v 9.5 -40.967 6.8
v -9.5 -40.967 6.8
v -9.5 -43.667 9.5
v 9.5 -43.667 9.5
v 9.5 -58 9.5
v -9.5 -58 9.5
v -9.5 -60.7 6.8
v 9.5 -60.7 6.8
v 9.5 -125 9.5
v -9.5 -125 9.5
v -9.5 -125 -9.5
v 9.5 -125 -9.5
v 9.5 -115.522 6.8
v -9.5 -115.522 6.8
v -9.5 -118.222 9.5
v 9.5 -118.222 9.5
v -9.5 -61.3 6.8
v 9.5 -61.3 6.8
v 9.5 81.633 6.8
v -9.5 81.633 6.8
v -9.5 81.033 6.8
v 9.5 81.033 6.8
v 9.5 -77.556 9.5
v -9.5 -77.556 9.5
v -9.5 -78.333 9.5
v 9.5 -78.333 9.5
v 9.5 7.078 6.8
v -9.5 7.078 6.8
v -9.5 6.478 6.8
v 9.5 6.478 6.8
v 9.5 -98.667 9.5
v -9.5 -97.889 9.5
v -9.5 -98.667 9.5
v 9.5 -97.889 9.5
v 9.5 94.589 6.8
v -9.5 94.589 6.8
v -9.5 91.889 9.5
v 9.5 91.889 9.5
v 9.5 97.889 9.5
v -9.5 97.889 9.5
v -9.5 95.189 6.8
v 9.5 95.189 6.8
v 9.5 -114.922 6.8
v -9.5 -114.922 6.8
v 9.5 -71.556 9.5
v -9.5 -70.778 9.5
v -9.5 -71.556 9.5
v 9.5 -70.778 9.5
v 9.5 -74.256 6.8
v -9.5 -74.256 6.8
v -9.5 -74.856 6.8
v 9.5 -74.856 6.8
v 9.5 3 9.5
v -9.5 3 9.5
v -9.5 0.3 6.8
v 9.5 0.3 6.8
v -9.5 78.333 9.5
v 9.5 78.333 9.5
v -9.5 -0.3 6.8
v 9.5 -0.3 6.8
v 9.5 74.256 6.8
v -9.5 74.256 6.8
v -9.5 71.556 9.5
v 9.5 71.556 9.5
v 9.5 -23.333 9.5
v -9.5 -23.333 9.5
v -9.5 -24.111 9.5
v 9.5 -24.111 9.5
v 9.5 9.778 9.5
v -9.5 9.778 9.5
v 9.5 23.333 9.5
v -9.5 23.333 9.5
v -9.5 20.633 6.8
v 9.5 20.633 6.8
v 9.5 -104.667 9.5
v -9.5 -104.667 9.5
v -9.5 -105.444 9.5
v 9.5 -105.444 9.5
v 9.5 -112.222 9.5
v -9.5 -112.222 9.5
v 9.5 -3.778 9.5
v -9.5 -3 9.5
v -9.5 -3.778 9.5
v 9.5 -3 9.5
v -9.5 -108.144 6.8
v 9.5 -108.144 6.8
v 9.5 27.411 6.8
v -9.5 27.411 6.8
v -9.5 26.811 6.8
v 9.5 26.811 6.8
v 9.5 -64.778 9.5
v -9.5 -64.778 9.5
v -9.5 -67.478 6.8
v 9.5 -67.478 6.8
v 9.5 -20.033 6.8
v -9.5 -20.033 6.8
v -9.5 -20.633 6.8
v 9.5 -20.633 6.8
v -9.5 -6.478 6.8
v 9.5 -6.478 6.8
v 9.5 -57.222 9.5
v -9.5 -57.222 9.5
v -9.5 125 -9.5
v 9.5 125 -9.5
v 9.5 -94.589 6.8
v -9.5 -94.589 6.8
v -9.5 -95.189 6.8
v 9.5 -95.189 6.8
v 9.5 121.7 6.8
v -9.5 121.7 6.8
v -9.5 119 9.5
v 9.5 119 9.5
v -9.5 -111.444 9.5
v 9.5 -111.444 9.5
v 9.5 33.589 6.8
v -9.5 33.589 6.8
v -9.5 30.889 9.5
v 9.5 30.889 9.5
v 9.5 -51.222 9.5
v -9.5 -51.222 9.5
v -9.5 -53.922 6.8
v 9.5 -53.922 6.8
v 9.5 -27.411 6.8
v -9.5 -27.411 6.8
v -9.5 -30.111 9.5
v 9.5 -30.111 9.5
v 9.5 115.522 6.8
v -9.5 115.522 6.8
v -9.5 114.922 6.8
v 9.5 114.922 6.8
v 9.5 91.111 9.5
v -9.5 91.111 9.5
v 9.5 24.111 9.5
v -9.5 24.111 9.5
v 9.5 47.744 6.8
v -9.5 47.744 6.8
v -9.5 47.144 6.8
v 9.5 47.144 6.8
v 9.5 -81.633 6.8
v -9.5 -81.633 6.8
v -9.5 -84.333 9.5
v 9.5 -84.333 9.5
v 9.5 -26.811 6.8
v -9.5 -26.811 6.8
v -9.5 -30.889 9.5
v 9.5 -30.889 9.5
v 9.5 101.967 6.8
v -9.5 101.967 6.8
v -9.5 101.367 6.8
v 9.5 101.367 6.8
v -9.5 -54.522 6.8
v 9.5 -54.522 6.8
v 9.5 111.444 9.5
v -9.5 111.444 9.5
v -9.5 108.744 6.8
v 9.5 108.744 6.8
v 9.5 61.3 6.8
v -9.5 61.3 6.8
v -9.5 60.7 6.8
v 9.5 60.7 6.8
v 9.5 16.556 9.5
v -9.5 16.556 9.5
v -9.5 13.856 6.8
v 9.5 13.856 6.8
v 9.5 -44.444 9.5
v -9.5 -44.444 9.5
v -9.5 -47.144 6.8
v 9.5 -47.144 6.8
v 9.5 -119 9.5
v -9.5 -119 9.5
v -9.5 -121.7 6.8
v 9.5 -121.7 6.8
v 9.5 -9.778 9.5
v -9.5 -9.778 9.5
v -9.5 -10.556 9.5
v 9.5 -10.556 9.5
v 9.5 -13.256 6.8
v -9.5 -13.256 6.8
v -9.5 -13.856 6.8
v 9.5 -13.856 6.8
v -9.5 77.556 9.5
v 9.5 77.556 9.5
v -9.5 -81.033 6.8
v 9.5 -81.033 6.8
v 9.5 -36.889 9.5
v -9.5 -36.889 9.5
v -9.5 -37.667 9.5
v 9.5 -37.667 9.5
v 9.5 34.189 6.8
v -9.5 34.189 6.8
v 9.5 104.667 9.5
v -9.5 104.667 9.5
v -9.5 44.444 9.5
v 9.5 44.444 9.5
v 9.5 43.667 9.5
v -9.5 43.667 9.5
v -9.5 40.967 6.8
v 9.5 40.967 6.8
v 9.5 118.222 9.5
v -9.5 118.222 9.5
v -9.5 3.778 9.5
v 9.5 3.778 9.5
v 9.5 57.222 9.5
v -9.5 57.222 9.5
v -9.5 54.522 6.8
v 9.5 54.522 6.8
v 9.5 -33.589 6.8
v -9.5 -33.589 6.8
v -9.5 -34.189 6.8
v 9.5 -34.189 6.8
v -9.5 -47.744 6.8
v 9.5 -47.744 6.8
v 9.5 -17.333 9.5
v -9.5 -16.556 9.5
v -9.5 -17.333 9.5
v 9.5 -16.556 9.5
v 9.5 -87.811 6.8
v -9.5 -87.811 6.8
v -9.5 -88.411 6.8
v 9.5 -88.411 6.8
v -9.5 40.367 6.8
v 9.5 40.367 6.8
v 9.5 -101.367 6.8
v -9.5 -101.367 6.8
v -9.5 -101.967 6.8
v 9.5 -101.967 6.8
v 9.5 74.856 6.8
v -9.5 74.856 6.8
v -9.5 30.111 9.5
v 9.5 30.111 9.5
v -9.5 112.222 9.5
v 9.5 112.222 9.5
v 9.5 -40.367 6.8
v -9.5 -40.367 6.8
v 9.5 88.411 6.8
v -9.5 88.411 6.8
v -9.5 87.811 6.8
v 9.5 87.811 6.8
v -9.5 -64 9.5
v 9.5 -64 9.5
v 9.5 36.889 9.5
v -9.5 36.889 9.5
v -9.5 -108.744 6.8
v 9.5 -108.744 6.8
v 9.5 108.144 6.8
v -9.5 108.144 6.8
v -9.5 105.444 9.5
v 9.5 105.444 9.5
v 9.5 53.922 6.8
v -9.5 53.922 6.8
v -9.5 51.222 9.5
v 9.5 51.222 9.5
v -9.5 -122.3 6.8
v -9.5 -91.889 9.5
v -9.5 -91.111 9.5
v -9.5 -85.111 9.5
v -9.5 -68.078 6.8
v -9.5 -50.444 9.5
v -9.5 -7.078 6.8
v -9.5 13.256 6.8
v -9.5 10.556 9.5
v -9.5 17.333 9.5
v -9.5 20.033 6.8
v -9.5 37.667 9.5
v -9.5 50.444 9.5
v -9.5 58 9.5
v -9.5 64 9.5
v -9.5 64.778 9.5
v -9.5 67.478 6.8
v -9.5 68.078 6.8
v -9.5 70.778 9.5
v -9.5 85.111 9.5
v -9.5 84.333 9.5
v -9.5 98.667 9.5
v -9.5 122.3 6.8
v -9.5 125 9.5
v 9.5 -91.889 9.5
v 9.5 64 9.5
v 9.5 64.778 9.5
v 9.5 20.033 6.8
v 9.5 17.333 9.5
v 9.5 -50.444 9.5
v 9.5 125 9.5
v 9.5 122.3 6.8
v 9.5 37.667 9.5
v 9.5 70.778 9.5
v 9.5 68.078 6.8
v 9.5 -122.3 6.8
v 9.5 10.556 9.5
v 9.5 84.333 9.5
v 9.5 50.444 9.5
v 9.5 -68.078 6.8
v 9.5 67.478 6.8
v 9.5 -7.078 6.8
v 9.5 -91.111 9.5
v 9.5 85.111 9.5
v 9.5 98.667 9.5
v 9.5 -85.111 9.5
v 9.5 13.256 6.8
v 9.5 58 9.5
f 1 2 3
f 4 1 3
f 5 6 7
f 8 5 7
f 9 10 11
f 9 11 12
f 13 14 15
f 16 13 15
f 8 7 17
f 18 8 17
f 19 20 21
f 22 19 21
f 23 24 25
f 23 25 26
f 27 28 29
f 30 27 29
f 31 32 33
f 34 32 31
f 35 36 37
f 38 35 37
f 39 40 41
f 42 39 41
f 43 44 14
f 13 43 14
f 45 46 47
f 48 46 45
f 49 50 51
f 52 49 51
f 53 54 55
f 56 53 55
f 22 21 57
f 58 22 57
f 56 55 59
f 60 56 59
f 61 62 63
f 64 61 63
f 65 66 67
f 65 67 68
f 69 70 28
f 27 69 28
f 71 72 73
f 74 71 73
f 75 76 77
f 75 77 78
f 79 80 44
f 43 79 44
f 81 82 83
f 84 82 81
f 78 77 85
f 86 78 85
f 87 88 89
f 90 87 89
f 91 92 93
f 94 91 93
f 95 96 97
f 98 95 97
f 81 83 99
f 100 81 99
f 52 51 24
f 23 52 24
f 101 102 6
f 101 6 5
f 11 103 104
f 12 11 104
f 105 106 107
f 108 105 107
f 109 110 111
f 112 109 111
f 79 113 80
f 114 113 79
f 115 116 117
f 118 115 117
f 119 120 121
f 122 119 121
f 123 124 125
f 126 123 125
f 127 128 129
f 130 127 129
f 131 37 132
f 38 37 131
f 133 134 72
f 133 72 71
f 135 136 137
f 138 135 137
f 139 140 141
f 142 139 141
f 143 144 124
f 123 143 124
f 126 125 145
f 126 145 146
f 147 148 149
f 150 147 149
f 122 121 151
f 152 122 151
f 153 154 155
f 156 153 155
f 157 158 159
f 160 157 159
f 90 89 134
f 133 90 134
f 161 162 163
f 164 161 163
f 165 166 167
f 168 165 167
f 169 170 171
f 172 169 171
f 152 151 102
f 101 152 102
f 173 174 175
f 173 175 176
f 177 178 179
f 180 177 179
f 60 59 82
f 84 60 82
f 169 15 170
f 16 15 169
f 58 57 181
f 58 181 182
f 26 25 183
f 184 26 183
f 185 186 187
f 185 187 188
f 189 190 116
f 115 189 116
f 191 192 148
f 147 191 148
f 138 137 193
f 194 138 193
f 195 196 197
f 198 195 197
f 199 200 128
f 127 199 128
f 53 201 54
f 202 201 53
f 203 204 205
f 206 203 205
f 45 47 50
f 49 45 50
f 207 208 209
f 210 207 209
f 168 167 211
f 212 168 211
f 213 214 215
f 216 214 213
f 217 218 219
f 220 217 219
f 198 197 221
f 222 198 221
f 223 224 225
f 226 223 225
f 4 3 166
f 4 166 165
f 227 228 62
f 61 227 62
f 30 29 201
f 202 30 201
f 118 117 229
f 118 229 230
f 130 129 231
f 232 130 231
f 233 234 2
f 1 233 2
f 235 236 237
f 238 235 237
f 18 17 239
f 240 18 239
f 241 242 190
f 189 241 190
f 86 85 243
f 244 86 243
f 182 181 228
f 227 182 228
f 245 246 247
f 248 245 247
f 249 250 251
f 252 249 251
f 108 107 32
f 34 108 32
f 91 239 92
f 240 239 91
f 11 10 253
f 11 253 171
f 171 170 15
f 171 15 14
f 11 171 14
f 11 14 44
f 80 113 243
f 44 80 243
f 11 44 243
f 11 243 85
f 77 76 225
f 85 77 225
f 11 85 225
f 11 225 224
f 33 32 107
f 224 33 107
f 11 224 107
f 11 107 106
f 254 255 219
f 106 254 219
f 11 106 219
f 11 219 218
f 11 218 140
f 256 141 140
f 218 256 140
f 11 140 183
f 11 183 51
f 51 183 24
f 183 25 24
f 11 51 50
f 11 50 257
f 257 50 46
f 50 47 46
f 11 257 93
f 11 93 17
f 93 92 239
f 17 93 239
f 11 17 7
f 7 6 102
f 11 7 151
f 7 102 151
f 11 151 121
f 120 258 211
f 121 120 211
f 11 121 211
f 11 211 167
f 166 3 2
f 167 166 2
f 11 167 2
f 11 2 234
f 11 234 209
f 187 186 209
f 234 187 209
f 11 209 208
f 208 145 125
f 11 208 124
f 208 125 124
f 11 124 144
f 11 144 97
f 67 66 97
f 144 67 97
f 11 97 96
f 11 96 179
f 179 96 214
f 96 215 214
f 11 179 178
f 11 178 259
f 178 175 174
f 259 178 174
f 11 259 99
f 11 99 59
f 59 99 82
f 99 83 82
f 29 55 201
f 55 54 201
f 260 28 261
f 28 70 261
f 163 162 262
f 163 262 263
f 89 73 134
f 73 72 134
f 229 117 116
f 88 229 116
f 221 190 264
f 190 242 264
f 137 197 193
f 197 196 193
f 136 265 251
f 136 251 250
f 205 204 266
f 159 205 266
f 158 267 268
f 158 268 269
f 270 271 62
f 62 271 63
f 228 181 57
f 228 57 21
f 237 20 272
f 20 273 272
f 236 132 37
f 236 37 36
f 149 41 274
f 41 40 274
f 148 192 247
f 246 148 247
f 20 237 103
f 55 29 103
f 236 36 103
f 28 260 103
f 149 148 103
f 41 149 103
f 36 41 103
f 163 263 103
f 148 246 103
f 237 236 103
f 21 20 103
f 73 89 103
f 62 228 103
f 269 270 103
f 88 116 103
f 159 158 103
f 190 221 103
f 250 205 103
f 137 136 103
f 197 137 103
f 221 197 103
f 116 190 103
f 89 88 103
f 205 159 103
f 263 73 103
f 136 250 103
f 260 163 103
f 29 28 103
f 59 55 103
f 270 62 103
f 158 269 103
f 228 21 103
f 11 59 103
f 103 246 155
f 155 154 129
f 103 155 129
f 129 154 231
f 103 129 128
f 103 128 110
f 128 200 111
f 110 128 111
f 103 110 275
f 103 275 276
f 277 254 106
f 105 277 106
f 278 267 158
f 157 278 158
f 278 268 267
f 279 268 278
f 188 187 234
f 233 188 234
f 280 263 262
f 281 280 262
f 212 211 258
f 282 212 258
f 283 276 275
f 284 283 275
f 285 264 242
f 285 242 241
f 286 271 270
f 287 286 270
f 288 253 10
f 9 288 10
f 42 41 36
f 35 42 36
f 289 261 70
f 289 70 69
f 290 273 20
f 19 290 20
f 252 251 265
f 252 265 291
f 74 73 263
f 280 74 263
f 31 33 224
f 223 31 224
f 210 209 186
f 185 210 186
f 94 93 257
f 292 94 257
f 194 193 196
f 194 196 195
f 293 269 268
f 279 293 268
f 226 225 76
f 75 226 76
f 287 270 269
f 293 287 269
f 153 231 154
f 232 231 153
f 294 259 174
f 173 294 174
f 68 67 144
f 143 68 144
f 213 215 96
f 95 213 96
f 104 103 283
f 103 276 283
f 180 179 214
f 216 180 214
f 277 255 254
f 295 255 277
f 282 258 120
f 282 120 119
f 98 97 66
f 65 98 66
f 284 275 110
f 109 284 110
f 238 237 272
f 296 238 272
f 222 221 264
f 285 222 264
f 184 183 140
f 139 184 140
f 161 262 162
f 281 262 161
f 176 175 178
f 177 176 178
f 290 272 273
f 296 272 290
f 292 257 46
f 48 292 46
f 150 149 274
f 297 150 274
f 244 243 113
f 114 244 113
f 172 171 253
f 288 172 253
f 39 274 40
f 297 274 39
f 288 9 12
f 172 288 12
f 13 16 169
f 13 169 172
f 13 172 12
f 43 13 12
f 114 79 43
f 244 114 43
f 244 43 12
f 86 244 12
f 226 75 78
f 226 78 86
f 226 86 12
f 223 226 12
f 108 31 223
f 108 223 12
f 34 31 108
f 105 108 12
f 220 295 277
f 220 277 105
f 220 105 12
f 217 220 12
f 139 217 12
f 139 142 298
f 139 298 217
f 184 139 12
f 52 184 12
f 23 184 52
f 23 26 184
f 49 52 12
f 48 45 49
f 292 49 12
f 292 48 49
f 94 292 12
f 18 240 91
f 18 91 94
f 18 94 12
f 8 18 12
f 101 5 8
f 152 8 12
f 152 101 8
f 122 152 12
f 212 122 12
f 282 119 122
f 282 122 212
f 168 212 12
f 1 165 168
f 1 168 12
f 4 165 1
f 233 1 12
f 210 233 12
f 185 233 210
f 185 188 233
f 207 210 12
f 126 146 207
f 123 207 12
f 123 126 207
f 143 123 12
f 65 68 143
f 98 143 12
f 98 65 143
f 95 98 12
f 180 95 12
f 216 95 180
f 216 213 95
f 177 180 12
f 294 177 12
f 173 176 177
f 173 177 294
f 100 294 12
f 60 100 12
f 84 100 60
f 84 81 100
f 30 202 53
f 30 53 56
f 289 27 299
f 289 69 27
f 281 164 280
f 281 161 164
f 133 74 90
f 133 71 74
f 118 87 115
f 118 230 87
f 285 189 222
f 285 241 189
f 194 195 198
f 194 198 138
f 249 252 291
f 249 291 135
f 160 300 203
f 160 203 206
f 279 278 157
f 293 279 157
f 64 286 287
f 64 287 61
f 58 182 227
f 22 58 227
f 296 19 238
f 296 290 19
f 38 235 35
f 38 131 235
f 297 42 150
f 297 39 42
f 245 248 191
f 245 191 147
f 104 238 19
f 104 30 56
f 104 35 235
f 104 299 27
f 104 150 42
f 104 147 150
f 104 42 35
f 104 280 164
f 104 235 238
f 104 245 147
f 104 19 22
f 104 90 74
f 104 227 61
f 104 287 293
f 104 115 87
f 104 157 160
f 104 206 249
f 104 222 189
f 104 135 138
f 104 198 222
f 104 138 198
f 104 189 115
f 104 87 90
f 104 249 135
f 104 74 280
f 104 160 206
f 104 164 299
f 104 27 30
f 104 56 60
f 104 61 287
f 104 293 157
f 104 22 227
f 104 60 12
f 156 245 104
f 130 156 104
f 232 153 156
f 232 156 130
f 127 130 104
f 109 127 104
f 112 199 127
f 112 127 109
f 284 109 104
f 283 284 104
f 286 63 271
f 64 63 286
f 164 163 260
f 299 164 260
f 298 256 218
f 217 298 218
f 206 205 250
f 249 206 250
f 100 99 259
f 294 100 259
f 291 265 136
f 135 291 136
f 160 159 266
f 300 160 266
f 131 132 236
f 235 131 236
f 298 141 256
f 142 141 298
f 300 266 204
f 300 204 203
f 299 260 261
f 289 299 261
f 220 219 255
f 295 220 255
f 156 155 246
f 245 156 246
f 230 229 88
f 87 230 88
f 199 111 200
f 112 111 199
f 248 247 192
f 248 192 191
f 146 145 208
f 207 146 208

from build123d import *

# Parameters (mm, degrees)
SKETCH1_W           = 19
SKETCH1_H           = 250
BOSS_EXTRUDE1_DEPTH = 9.5
CUT_EXTRUDE1_DEPTH  = 29


with BuildPart() as part:
    # Sketch1 → Boss-Extrude1 (new body, symmetric)
    with BuildSketch(Plane.XY):
        Rectangle(SKETCH1_W, SKETCH1_H)
    extrude(amount=BOSS_EXTRUDE1_DEPTH, both=True)

    # Sketch2 → Cut-Extrude1 (cut)
    with BuildSketch(Plane.ZY.offset(9.5)):
        Polygon((9.5, 125), (6.8, 122.3), (6.8, 121.7), (9.5, 119), (10.5, 119), (10.5, 125), align=None)
        Polygon((9.5, 118.222222222), (6.8, 115.522222222), (6.8, 114.922222222), (9.5, 112.222222222), (10.5, 112.222222222), (10.5, 118.222222222), align=None)
        Polygon((9.5, 111.444444444), (6.8, 108.744444444), (6.8, 108.144444444), (9.5, 105.444444444), (10.5, 105.444444444), (10.5, 111.444444444), align=None)
        Polygon((9.5, 104.666666667), (6.8, 101.966666667), (6.8, 101.366666667), (9.5, 98.666666667), (10.5, 98.666666667), (10.5, 104.666666667), align=None)
        Polygon((9.5, 97.888888889), (6.8, 95.188888889), (6.8, 94.588888889), (9.5, 91.888888889), (10.5, 91.888888889), (10.5, 97.888888889), align=None)
        Polygon((9.5, 91.111111111), (6.8, 88.411111111), (6.8, 87.811111111), (9.5, 85.111111111), (10.5, 85.111111111), (10.5, 91.111111111), align=None)
        Polygon((9.5, 84.333333333), (6.8, 81.633333333), (6.8, 81.033333333), (9.5, 78.333333333), (10.5, 78.333333333), (10.5, 84.333333333), align=None)
        Polygon((9.5, 77.555555556), (6.8, 74.855555556), (6.8, 74.255555556), (9.5, 71.555555556), (10.5, 71.555555556), (10.5, 77.555555556), align=None)
        Polygon((9.5, 70.777777778), (6.8, 68.077777778), (6.8, 67.477777778), (9.5, 64.777777778), (10.5, 64.777777778), (10.5, 70.777777778), align=None)
        Polygon((9.5, 64), (6.8, 61.3), (6.8, 60.7), (9.5, 58), (10.5, 58), (10.5, 64), align=None)
        Polygon((9.5, 57.222222222), (6.8, 54.522222222), (6.8, 53.922222222), (9.5, 51.222222222), (10.5, 51.222222222), (10.5, 57.222222222), align=None)
        Polygon((9.5, 50.444444444), (6.8, 47.744444444), (6.8, 47.144444444), (9.5, 44.444444444), (10.5, 44.444444444), (10.5, 50.444444444), align=None)
        Polygon((9.5, 43.666666667), (6.8, 40.966666667), (6.8, 40.366666667), (9.5, 37.666666667), (10.5, 37.666666667), (10.5, 43.666666667), align=None)
        Polygon((9.5, 36.888888889), (6.8, 34.188888889), (6.8, 33.588888889), (9.5, 30.888888889), (10.5, 30.888888889), (10.5, 36.888888889), align=None)
        Polygon((9.5, 30.111111111), (6.8, 27.411111111), (6.8, 26.811111111), (9.5, 24.111111111), (10.5, 24.111111111), (10.5, 30.111111111), align=None)
        Polygon((9.5, 23.333333333), (6.8, 20.633333333), (6.8, 20.033333333), (9.5, 17.333333333), (10.5, 17.333333333), (10.5, 23.333333333), align=None)
        Polygon((9.5, 16.555555556), (6.8, 13.855555556), (6.8, 13.255555556), (9.5, 10.555555556), (10.5, 10.555555556), (10.5, 16.555555556), align=None)
        Polygon((9.5, 9.777777778), (6.8, 7.077777778), (6.8, 6.477777778), (9.5, 3.777777778), (10.5, 3.777777778), (10.5, 9.777777778), align=None)
        Polygon((9.5, 3), (6.8, 0.3), (6.8, -0.3), (9.5, -3), (10.5, -3), (10.5, 3), align=None)
        Polygon((9.5, -3.777777778), (6.8, -6.477777778), (6.8, -7.077777778), (9.5, -9.777777778), (10.5, -9.777777778), (10.5, -3.777777778), align=None)
        Polygon((9.5, -10.555555556), (6.8, -13.255555556), (6.8, -13.855555556), (9.5, -16.555555556), (10.5, -16.555555556), (10.5, -10.555555556), align=None)
        Polygon((9.5, -17.333333333), (6.8, -20.033333333), (6.8, -20.633333333), (9.5, -23.333333333), (10.5, -23.333333333), (10.5, -17.333333333), align=None)
        Polygon((9.5, -24.111111111), (6.8, -26.811111111), (6.8, -27.411111111), (9.5, -30.111111111), (10.5, -30.111111111), (10.5, -24.111111111), align=None)
        Polygon((9.5, -30.888888889), (6.8, -33.588888889), (6.8, -34.188888889), (9.5, -36.888888889), (10.5, -36.888888889), (10.5, -30.888888889), align=None)
        Polygon((9.5, -37.666666667), (6.8, -40.366666667), (6.8, -40.966666667), (9.5, -43.666666667), (10.5, -43.666666667), (10.5, -37.666666667), align=None)
        Polygon((9.5, -44.444444444), (6.8, -47.144444444), (6.8, -47.744444444), (9.5, -50.444444444), (10.5, -50.444444444), (10.5, -44.444444444), align=None)
        Polygon((9.5, -51.222222222), (6.8, -53.922222222), (6.8, -54.522222222), (9.5, -57.222222222), (10.5, -57.222222222), (10.5, -51.222222222), align=None)
        Polygon((9.5, -58), (6.8, -60.7), (6.8, -61.3), (9.5, -64), (10.5, -64), (10.5, -58), align=None)
        Polygon((9.5, -64.777777778), (6.8, -67.477777778), (6.8, -68.077777778), (9.5, -70.777777778), (10.5, -70.777777778), (10.5, -64.777777778), align=None)
        Polygon((9.5, -71.555555556), (6.8, -74.255555556), (6.8, -74.855555556), (9.5, -77.555555556), (10.5, -77.555555556), (10.5, -71.555555556), align=None)
        Polygon((9.5, -78.333333333), (6.8, -81.033333333), (6.8, -81.633333333), (9.5, -84.333333333), (10.5, -84.333333333), (10.5, -78.333333333), align=None)
        Polygon((9.5, -85.111111111), (6.8, -87.811111111), (6.8, -88.411111111), (9.5, -91.111111111), (10.5, -91.111111111), (10.5, -85.111111111), align=None)
        Polygon((9.5, -91.888888889), (6.8, -94.588888889), (6.8, -95.188888889), (9.5, -97.888888889), (10.5, -97.888888889), (10.5, -91.888888889), align=None)
        Polygon((9.5, -98.666666667), (6.8, -101.366666667), (6.8, -101.966666667), (9.5, -104.666666667), (10.5, -104.666666667), (10.5, -98.666666667), align=None)
        Polygon((9.5, -105.444444444), (6.8, -108.144444444), (6.8, -108.744444444), (9.5, -111.444444444), (10.5, -111.444444444), (10.5, -105.444444444), align=None)
        Polygon((9.5, -112.222222222), (6.8, -114.922222222), (6.8, -115.522222222), (9.5, -118.222222222), (10.5, -118.222222222), (10.5, -112.222222222), align=None)
        Polygon((9.5, -119), (6.8, -121.7), (6.8, -122.3), (9.5, -125), (10.5, -125), (10.5, -119), align=None)
    extrude(amount=-CUT_EXTRUDE1_DEPTH, mode=Mode.SUBTRACT)


solid = part.part
